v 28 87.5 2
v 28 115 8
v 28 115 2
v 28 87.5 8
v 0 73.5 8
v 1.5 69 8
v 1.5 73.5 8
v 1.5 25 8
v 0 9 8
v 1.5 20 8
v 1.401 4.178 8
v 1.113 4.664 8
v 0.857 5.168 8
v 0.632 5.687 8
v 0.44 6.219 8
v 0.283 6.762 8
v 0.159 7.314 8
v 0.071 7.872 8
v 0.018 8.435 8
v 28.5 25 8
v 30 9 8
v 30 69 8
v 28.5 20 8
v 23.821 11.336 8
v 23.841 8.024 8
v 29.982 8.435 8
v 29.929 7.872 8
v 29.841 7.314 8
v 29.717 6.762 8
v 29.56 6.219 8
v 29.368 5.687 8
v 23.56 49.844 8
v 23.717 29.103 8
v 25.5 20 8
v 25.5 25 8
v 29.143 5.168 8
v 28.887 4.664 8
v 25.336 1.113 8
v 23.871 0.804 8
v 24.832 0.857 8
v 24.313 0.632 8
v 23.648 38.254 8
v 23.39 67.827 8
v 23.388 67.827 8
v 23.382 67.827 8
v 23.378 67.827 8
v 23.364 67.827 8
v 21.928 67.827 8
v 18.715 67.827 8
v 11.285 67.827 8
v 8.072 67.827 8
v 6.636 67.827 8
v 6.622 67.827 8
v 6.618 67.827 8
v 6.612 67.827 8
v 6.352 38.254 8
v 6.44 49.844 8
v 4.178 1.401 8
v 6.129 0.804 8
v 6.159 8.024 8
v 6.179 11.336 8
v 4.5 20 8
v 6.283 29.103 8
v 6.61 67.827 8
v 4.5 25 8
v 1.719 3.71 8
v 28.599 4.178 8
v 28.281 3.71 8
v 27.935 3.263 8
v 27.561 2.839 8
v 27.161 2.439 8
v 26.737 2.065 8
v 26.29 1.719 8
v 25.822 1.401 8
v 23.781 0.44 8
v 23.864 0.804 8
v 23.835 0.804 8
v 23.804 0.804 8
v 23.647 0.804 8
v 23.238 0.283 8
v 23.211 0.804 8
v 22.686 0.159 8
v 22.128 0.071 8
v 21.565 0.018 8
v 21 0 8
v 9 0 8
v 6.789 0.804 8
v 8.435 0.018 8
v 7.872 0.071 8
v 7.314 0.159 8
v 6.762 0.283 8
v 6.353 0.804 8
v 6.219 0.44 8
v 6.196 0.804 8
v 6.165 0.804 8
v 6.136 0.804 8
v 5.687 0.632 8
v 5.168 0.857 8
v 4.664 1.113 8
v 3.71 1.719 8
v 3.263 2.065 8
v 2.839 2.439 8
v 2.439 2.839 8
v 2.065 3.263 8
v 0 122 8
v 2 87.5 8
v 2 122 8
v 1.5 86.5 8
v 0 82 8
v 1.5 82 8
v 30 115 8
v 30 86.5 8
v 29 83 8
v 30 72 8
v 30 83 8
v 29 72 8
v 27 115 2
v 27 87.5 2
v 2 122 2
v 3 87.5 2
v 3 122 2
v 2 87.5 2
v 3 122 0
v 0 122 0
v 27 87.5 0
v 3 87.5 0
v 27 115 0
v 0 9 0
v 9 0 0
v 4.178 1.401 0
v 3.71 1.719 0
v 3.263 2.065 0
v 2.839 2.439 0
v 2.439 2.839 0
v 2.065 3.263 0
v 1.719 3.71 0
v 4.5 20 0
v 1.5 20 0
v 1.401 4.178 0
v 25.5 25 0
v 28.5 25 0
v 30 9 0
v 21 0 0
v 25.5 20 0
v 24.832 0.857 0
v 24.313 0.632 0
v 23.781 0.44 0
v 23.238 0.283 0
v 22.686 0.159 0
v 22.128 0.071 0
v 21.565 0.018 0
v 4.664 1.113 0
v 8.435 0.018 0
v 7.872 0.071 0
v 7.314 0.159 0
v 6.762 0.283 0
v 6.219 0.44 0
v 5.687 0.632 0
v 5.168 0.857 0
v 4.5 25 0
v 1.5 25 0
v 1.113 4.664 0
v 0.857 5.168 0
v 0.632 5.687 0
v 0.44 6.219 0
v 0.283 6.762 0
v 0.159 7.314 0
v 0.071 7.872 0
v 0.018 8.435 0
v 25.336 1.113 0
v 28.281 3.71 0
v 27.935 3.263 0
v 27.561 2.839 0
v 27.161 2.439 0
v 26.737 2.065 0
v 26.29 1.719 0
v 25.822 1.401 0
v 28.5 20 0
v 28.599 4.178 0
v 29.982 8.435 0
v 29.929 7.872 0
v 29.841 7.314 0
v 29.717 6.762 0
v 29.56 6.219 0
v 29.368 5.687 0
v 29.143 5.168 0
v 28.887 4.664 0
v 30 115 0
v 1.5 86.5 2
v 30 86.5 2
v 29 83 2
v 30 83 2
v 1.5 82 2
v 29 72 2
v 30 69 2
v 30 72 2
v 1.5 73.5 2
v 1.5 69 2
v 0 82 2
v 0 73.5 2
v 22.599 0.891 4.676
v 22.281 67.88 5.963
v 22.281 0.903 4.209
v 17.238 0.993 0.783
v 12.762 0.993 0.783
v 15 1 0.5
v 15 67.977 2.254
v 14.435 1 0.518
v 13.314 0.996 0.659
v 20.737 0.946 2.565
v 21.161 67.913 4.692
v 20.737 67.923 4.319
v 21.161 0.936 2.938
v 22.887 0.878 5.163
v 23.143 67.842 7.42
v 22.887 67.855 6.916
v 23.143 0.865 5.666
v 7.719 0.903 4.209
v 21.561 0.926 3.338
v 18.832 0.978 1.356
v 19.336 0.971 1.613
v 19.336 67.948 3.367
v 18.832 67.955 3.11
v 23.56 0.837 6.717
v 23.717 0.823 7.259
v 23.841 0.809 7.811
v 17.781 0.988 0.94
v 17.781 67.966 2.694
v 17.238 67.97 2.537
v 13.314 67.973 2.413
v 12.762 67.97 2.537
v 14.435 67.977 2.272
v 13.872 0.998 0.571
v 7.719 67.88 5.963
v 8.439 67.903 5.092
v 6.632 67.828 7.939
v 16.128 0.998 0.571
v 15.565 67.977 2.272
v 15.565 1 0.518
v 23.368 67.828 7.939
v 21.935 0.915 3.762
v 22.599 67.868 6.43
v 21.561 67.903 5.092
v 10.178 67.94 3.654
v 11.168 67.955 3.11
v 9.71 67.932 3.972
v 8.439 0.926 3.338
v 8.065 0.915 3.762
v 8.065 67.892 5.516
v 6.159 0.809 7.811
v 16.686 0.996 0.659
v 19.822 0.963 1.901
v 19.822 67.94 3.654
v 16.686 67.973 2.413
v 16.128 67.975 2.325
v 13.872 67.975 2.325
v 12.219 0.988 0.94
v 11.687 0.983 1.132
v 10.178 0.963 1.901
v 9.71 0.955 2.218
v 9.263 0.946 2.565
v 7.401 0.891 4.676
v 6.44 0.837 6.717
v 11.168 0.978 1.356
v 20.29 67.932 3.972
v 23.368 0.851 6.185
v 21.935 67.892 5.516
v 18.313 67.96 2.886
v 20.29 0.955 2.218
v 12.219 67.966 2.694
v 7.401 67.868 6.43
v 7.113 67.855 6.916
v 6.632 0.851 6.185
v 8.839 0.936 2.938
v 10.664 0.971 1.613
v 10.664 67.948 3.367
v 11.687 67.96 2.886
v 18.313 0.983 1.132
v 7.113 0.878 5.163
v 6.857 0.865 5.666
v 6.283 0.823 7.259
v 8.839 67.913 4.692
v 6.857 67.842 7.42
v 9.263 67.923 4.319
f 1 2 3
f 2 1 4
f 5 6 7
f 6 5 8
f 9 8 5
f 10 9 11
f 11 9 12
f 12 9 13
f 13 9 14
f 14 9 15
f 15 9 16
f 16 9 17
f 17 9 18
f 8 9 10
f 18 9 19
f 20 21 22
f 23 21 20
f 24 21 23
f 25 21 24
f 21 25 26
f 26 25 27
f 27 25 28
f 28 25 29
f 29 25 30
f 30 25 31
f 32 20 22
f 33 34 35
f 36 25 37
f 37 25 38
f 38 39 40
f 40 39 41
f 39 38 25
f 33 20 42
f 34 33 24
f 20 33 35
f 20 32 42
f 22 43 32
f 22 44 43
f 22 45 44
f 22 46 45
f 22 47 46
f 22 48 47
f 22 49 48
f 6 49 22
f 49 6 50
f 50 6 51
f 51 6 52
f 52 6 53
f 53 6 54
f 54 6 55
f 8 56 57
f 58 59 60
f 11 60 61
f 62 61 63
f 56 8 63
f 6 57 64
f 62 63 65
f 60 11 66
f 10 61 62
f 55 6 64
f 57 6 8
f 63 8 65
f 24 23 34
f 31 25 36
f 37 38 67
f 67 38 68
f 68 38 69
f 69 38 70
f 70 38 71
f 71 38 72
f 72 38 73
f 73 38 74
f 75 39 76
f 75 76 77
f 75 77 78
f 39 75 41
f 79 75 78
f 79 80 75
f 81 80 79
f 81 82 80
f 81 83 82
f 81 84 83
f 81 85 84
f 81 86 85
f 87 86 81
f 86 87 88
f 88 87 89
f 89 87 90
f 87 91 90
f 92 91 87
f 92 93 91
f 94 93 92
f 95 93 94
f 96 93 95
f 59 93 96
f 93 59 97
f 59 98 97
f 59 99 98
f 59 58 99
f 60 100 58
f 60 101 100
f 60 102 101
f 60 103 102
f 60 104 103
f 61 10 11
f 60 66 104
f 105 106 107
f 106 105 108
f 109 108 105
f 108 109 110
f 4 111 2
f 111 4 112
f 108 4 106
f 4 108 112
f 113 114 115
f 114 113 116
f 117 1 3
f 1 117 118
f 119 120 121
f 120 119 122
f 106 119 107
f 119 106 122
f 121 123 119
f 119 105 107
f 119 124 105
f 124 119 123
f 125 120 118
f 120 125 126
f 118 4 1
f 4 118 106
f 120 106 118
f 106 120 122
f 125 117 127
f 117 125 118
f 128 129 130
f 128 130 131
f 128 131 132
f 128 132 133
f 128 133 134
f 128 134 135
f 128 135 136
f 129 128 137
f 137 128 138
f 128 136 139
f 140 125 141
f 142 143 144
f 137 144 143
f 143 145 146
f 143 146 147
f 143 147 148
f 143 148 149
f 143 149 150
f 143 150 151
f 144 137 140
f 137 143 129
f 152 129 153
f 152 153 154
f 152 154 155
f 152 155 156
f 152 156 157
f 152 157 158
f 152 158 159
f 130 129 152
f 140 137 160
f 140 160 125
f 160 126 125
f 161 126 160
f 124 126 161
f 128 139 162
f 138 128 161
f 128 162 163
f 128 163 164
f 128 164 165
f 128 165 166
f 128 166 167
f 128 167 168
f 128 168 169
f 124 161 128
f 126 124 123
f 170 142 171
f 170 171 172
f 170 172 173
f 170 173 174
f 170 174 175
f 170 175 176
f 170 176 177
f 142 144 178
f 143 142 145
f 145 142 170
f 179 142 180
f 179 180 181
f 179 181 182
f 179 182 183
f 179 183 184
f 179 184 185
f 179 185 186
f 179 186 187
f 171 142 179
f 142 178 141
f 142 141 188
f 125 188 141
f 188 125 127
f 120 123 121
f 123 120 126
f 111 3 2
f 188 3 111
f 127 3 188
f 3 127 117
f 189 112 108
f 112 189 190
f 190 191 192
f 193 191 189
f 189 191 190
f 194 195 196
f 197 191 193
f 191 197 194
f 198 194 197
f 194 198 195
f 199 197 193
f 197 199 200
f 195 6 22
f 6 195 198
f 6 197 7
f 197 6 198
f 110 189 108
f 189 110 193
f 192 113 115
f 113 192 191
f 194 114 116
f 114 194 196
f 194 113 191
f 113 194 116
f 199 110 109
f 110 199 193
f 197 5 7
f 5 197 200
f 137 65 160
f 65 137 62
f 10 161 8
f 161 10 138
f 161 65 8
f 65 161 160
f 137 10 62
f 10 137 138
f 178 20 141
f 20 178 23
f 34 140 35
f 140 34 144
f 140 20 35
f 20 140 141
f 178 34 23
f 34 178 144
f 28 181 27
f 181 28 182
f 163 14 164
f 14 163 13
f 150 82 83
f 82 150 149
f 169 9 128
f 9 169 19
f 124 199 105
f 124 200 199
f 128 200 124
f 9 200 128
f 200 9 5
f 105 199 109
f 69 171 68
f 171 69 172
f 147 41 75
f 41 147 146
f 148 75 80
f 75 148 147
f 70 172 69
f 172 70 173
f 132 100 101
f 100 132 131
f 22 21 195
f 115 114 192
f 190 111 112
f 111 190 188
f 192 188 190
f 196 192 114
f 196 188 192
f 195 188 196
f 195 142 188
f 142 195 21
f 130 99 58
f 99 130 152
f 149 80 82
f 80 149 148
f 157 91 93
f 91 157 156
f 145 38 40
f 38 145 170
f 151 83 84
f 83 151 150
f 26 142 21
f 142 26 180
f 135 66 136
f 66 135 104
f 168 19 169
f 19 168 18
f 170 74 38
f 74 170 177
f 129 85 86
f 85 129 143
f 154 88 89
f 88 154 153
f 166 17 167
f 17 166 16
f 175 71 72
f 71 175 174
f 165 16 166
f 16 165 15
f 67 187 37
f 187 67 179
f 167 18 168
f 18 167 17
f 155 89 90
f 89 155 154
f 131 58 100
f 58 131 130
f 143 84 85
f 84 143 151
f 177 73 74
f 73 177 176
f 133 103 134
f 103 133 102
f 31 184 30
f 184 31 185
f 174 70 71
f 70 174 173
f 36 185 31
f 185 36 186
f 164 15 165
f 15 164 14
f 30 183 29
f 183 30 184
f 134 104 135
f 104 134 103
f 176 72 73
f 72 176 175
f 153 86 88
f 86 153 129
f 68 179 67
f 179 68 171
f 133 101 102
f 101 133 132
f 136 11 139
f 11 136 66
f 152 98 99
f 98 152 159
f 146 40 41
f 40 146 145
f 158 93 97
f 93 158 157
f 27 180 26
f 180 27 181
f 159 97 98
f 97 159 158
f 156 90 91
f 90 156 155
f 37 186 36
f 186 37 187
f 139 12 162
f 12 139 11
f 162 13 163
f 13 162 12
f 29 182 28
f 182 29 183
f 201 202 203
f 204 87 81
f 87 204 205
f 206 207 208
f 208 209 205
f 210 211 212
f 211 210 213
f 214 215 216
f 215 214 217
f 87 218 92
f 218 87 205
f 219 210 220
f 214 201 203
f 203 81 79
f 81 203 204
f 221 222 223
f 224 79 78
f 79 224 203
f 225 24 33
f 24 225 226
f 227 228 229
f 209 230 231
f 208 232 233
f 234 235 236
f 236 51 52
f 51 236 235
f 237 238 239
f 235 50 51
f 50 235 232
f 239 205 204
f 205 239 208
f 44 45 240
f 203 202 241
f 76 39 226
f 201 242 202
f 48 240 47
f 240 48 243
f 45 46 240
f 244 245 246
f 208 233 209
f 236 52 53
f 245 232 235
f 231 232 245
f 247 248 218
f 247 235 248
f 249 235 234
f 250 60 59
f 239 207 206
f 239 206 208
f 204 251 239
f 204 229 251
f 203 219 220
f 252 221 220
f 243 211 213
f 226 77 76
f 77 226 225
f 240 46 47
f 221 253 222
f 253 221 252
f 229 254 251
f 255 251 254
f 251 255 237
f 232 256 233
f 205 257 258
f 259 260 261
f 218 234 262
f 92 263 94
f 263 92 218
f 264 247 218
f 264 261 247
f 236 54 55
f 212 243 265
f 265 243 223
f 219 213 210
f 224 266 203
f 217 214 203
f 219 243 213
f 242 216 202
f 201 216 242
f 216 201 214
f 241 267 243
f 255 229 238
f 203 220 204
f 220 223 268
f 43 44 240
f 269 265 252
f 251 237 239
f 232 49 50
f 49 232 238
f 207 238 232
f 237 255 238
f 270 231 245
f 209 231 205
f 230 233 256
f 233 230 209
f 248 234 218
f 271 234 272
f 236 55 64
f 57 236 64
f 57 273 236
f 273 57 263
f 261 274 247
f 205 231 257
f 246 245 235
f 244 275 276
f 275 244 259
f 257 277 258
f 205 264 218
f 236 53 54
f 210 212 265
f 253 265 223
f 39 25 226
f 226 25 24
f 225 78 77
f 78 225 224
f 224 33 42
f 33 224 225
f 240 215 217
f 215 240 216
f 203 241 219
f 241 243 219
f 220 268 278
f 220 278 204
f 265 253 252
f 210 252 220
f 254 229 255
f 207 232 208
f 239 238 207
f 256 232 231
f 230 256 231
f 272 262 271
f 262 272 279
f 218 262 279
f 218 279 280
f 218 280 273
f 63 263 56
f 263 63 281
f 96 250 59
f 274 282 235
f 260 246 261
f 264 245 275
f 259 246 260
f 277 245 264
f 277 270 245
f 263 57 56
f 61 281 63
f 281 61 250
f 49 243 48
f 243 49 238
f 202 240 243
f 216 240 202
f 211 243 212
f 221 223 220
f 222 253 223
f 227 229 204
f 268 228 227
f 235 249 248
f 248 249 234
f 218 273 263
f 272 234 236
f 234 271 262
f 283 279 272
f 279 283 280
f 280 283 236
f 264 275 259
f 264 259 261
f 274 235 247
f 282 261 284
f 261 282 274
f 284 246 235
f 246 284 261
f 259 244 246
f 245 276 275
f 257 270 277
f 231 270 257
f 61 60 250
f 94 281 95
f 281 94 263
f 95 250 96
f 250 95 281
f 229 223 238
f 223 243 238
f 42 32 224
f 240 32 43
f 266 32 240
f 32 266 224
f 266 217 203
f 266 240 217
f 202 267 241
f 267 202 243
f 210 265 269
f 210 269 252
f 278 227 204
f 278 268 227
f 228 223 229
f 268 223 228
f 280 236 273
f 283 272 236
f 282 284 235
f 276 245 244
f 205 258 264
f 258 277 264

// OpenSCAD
$fn = 100;

w = 30;
h = 122;
d = 8;
// depth of shelf
dshelf = 6;
edge = 2;

// buffer around parts for tolerance
b = 0.5;

// width/height of d1
wd1 = 25 + (2 * b);
hd1 = 34 + b;
// width/height of charger
wcharger = 17 + b;
hcharger = 29 + b;
// radius/height of battery
rbat = 9;
hbat = 66 + (2 * b);
// width/height of d1


module charger() {
    w = wcharger;
    h = hcharger;
    // cutout for feet
    wcutout = 11;
    hcutout = 2;
    // feet (i.e. either side of cutout)
    wfeet = 3;
    // usb
    wusb = 7 + (3 * b);
    husb = 4;
    
    translate([0, 0, d - dshelf]) {
        difference() {
            // base
            cube([w, h, dshelf]);

            // cutout for feet, 3mm either side
            // -1, -1 to oversize for difference
            translate([wfeet, 0, 0])
            cube([wcutout, hcutout, dshelf]);
        }

        // usb
        translate([(w - wusb) / 2, h - (husb / 2), 0])
        cube([wusb, husb, dshelf]);
    }
}

module d1() {
    // width and height of board
    w = wd1;
    h = hd1;
    // width of shelf
    wshelf = 1;
    // height of window for reset switch
    hreset = 7;
    // width the reset switch needs to 
    // extend outside by
    wreset = wshelf * 5;
    
    // top, to make sides
    translate([0, 0, (d - dshelf)])
    cube([w, h, dshelf]);

    // bottom, to cut between shelves
    translate([wshelf, 0, 0])
    cube([w - (wshelf * 2), h, d]); 
    
    // reset switch
    translate([w - wshelf, h - hreset, 0])
    cube([wreset, hreset, d]);
}

module sled() {
    // radius of rounded corner
    r = 9;

    hull() {
        translate([0, r, 0])
        cube([w, h - r, d]);

        translate([r, r, 0])
        cylinder(r = r, h = d);

        translate([w - r, r, 0])
        cylinder(r = r, h = d);
    }
}

module battery() {
    r = rbat;
    h = hbat;
    
    translate([r, 0, r])
    rotate([-90, 0, 0])
    cylinder(r = r, h = h);
}

// edge either side of battery
edgeb = (w - (rbat * 2)) / 2;

module clips() {
    wb = 3;
    hb = 5;
    from_side = (edgeb - 3) / 2;
    
    translate([from_side, 0, 0])
    cube([wb, hb, d]);
    
    translate([w - from_side - wb, 0, 0])
    cube([wb, hb, d]);

}

difference() {
    sled();
    
    translate([(w - wd1) / 2, h - hd1, 0])
    d1();
    
    translate([hcharger + 1.5, h - hd1 - wcharger - 1, 0])
    rotate([0, 0, 90])
    charger();
    
    translate([edgeb, 1, .5])
    rotate([1.5, 0, 0])
    battery();
    
    translate([0, 20, 0])
    clips();
}
